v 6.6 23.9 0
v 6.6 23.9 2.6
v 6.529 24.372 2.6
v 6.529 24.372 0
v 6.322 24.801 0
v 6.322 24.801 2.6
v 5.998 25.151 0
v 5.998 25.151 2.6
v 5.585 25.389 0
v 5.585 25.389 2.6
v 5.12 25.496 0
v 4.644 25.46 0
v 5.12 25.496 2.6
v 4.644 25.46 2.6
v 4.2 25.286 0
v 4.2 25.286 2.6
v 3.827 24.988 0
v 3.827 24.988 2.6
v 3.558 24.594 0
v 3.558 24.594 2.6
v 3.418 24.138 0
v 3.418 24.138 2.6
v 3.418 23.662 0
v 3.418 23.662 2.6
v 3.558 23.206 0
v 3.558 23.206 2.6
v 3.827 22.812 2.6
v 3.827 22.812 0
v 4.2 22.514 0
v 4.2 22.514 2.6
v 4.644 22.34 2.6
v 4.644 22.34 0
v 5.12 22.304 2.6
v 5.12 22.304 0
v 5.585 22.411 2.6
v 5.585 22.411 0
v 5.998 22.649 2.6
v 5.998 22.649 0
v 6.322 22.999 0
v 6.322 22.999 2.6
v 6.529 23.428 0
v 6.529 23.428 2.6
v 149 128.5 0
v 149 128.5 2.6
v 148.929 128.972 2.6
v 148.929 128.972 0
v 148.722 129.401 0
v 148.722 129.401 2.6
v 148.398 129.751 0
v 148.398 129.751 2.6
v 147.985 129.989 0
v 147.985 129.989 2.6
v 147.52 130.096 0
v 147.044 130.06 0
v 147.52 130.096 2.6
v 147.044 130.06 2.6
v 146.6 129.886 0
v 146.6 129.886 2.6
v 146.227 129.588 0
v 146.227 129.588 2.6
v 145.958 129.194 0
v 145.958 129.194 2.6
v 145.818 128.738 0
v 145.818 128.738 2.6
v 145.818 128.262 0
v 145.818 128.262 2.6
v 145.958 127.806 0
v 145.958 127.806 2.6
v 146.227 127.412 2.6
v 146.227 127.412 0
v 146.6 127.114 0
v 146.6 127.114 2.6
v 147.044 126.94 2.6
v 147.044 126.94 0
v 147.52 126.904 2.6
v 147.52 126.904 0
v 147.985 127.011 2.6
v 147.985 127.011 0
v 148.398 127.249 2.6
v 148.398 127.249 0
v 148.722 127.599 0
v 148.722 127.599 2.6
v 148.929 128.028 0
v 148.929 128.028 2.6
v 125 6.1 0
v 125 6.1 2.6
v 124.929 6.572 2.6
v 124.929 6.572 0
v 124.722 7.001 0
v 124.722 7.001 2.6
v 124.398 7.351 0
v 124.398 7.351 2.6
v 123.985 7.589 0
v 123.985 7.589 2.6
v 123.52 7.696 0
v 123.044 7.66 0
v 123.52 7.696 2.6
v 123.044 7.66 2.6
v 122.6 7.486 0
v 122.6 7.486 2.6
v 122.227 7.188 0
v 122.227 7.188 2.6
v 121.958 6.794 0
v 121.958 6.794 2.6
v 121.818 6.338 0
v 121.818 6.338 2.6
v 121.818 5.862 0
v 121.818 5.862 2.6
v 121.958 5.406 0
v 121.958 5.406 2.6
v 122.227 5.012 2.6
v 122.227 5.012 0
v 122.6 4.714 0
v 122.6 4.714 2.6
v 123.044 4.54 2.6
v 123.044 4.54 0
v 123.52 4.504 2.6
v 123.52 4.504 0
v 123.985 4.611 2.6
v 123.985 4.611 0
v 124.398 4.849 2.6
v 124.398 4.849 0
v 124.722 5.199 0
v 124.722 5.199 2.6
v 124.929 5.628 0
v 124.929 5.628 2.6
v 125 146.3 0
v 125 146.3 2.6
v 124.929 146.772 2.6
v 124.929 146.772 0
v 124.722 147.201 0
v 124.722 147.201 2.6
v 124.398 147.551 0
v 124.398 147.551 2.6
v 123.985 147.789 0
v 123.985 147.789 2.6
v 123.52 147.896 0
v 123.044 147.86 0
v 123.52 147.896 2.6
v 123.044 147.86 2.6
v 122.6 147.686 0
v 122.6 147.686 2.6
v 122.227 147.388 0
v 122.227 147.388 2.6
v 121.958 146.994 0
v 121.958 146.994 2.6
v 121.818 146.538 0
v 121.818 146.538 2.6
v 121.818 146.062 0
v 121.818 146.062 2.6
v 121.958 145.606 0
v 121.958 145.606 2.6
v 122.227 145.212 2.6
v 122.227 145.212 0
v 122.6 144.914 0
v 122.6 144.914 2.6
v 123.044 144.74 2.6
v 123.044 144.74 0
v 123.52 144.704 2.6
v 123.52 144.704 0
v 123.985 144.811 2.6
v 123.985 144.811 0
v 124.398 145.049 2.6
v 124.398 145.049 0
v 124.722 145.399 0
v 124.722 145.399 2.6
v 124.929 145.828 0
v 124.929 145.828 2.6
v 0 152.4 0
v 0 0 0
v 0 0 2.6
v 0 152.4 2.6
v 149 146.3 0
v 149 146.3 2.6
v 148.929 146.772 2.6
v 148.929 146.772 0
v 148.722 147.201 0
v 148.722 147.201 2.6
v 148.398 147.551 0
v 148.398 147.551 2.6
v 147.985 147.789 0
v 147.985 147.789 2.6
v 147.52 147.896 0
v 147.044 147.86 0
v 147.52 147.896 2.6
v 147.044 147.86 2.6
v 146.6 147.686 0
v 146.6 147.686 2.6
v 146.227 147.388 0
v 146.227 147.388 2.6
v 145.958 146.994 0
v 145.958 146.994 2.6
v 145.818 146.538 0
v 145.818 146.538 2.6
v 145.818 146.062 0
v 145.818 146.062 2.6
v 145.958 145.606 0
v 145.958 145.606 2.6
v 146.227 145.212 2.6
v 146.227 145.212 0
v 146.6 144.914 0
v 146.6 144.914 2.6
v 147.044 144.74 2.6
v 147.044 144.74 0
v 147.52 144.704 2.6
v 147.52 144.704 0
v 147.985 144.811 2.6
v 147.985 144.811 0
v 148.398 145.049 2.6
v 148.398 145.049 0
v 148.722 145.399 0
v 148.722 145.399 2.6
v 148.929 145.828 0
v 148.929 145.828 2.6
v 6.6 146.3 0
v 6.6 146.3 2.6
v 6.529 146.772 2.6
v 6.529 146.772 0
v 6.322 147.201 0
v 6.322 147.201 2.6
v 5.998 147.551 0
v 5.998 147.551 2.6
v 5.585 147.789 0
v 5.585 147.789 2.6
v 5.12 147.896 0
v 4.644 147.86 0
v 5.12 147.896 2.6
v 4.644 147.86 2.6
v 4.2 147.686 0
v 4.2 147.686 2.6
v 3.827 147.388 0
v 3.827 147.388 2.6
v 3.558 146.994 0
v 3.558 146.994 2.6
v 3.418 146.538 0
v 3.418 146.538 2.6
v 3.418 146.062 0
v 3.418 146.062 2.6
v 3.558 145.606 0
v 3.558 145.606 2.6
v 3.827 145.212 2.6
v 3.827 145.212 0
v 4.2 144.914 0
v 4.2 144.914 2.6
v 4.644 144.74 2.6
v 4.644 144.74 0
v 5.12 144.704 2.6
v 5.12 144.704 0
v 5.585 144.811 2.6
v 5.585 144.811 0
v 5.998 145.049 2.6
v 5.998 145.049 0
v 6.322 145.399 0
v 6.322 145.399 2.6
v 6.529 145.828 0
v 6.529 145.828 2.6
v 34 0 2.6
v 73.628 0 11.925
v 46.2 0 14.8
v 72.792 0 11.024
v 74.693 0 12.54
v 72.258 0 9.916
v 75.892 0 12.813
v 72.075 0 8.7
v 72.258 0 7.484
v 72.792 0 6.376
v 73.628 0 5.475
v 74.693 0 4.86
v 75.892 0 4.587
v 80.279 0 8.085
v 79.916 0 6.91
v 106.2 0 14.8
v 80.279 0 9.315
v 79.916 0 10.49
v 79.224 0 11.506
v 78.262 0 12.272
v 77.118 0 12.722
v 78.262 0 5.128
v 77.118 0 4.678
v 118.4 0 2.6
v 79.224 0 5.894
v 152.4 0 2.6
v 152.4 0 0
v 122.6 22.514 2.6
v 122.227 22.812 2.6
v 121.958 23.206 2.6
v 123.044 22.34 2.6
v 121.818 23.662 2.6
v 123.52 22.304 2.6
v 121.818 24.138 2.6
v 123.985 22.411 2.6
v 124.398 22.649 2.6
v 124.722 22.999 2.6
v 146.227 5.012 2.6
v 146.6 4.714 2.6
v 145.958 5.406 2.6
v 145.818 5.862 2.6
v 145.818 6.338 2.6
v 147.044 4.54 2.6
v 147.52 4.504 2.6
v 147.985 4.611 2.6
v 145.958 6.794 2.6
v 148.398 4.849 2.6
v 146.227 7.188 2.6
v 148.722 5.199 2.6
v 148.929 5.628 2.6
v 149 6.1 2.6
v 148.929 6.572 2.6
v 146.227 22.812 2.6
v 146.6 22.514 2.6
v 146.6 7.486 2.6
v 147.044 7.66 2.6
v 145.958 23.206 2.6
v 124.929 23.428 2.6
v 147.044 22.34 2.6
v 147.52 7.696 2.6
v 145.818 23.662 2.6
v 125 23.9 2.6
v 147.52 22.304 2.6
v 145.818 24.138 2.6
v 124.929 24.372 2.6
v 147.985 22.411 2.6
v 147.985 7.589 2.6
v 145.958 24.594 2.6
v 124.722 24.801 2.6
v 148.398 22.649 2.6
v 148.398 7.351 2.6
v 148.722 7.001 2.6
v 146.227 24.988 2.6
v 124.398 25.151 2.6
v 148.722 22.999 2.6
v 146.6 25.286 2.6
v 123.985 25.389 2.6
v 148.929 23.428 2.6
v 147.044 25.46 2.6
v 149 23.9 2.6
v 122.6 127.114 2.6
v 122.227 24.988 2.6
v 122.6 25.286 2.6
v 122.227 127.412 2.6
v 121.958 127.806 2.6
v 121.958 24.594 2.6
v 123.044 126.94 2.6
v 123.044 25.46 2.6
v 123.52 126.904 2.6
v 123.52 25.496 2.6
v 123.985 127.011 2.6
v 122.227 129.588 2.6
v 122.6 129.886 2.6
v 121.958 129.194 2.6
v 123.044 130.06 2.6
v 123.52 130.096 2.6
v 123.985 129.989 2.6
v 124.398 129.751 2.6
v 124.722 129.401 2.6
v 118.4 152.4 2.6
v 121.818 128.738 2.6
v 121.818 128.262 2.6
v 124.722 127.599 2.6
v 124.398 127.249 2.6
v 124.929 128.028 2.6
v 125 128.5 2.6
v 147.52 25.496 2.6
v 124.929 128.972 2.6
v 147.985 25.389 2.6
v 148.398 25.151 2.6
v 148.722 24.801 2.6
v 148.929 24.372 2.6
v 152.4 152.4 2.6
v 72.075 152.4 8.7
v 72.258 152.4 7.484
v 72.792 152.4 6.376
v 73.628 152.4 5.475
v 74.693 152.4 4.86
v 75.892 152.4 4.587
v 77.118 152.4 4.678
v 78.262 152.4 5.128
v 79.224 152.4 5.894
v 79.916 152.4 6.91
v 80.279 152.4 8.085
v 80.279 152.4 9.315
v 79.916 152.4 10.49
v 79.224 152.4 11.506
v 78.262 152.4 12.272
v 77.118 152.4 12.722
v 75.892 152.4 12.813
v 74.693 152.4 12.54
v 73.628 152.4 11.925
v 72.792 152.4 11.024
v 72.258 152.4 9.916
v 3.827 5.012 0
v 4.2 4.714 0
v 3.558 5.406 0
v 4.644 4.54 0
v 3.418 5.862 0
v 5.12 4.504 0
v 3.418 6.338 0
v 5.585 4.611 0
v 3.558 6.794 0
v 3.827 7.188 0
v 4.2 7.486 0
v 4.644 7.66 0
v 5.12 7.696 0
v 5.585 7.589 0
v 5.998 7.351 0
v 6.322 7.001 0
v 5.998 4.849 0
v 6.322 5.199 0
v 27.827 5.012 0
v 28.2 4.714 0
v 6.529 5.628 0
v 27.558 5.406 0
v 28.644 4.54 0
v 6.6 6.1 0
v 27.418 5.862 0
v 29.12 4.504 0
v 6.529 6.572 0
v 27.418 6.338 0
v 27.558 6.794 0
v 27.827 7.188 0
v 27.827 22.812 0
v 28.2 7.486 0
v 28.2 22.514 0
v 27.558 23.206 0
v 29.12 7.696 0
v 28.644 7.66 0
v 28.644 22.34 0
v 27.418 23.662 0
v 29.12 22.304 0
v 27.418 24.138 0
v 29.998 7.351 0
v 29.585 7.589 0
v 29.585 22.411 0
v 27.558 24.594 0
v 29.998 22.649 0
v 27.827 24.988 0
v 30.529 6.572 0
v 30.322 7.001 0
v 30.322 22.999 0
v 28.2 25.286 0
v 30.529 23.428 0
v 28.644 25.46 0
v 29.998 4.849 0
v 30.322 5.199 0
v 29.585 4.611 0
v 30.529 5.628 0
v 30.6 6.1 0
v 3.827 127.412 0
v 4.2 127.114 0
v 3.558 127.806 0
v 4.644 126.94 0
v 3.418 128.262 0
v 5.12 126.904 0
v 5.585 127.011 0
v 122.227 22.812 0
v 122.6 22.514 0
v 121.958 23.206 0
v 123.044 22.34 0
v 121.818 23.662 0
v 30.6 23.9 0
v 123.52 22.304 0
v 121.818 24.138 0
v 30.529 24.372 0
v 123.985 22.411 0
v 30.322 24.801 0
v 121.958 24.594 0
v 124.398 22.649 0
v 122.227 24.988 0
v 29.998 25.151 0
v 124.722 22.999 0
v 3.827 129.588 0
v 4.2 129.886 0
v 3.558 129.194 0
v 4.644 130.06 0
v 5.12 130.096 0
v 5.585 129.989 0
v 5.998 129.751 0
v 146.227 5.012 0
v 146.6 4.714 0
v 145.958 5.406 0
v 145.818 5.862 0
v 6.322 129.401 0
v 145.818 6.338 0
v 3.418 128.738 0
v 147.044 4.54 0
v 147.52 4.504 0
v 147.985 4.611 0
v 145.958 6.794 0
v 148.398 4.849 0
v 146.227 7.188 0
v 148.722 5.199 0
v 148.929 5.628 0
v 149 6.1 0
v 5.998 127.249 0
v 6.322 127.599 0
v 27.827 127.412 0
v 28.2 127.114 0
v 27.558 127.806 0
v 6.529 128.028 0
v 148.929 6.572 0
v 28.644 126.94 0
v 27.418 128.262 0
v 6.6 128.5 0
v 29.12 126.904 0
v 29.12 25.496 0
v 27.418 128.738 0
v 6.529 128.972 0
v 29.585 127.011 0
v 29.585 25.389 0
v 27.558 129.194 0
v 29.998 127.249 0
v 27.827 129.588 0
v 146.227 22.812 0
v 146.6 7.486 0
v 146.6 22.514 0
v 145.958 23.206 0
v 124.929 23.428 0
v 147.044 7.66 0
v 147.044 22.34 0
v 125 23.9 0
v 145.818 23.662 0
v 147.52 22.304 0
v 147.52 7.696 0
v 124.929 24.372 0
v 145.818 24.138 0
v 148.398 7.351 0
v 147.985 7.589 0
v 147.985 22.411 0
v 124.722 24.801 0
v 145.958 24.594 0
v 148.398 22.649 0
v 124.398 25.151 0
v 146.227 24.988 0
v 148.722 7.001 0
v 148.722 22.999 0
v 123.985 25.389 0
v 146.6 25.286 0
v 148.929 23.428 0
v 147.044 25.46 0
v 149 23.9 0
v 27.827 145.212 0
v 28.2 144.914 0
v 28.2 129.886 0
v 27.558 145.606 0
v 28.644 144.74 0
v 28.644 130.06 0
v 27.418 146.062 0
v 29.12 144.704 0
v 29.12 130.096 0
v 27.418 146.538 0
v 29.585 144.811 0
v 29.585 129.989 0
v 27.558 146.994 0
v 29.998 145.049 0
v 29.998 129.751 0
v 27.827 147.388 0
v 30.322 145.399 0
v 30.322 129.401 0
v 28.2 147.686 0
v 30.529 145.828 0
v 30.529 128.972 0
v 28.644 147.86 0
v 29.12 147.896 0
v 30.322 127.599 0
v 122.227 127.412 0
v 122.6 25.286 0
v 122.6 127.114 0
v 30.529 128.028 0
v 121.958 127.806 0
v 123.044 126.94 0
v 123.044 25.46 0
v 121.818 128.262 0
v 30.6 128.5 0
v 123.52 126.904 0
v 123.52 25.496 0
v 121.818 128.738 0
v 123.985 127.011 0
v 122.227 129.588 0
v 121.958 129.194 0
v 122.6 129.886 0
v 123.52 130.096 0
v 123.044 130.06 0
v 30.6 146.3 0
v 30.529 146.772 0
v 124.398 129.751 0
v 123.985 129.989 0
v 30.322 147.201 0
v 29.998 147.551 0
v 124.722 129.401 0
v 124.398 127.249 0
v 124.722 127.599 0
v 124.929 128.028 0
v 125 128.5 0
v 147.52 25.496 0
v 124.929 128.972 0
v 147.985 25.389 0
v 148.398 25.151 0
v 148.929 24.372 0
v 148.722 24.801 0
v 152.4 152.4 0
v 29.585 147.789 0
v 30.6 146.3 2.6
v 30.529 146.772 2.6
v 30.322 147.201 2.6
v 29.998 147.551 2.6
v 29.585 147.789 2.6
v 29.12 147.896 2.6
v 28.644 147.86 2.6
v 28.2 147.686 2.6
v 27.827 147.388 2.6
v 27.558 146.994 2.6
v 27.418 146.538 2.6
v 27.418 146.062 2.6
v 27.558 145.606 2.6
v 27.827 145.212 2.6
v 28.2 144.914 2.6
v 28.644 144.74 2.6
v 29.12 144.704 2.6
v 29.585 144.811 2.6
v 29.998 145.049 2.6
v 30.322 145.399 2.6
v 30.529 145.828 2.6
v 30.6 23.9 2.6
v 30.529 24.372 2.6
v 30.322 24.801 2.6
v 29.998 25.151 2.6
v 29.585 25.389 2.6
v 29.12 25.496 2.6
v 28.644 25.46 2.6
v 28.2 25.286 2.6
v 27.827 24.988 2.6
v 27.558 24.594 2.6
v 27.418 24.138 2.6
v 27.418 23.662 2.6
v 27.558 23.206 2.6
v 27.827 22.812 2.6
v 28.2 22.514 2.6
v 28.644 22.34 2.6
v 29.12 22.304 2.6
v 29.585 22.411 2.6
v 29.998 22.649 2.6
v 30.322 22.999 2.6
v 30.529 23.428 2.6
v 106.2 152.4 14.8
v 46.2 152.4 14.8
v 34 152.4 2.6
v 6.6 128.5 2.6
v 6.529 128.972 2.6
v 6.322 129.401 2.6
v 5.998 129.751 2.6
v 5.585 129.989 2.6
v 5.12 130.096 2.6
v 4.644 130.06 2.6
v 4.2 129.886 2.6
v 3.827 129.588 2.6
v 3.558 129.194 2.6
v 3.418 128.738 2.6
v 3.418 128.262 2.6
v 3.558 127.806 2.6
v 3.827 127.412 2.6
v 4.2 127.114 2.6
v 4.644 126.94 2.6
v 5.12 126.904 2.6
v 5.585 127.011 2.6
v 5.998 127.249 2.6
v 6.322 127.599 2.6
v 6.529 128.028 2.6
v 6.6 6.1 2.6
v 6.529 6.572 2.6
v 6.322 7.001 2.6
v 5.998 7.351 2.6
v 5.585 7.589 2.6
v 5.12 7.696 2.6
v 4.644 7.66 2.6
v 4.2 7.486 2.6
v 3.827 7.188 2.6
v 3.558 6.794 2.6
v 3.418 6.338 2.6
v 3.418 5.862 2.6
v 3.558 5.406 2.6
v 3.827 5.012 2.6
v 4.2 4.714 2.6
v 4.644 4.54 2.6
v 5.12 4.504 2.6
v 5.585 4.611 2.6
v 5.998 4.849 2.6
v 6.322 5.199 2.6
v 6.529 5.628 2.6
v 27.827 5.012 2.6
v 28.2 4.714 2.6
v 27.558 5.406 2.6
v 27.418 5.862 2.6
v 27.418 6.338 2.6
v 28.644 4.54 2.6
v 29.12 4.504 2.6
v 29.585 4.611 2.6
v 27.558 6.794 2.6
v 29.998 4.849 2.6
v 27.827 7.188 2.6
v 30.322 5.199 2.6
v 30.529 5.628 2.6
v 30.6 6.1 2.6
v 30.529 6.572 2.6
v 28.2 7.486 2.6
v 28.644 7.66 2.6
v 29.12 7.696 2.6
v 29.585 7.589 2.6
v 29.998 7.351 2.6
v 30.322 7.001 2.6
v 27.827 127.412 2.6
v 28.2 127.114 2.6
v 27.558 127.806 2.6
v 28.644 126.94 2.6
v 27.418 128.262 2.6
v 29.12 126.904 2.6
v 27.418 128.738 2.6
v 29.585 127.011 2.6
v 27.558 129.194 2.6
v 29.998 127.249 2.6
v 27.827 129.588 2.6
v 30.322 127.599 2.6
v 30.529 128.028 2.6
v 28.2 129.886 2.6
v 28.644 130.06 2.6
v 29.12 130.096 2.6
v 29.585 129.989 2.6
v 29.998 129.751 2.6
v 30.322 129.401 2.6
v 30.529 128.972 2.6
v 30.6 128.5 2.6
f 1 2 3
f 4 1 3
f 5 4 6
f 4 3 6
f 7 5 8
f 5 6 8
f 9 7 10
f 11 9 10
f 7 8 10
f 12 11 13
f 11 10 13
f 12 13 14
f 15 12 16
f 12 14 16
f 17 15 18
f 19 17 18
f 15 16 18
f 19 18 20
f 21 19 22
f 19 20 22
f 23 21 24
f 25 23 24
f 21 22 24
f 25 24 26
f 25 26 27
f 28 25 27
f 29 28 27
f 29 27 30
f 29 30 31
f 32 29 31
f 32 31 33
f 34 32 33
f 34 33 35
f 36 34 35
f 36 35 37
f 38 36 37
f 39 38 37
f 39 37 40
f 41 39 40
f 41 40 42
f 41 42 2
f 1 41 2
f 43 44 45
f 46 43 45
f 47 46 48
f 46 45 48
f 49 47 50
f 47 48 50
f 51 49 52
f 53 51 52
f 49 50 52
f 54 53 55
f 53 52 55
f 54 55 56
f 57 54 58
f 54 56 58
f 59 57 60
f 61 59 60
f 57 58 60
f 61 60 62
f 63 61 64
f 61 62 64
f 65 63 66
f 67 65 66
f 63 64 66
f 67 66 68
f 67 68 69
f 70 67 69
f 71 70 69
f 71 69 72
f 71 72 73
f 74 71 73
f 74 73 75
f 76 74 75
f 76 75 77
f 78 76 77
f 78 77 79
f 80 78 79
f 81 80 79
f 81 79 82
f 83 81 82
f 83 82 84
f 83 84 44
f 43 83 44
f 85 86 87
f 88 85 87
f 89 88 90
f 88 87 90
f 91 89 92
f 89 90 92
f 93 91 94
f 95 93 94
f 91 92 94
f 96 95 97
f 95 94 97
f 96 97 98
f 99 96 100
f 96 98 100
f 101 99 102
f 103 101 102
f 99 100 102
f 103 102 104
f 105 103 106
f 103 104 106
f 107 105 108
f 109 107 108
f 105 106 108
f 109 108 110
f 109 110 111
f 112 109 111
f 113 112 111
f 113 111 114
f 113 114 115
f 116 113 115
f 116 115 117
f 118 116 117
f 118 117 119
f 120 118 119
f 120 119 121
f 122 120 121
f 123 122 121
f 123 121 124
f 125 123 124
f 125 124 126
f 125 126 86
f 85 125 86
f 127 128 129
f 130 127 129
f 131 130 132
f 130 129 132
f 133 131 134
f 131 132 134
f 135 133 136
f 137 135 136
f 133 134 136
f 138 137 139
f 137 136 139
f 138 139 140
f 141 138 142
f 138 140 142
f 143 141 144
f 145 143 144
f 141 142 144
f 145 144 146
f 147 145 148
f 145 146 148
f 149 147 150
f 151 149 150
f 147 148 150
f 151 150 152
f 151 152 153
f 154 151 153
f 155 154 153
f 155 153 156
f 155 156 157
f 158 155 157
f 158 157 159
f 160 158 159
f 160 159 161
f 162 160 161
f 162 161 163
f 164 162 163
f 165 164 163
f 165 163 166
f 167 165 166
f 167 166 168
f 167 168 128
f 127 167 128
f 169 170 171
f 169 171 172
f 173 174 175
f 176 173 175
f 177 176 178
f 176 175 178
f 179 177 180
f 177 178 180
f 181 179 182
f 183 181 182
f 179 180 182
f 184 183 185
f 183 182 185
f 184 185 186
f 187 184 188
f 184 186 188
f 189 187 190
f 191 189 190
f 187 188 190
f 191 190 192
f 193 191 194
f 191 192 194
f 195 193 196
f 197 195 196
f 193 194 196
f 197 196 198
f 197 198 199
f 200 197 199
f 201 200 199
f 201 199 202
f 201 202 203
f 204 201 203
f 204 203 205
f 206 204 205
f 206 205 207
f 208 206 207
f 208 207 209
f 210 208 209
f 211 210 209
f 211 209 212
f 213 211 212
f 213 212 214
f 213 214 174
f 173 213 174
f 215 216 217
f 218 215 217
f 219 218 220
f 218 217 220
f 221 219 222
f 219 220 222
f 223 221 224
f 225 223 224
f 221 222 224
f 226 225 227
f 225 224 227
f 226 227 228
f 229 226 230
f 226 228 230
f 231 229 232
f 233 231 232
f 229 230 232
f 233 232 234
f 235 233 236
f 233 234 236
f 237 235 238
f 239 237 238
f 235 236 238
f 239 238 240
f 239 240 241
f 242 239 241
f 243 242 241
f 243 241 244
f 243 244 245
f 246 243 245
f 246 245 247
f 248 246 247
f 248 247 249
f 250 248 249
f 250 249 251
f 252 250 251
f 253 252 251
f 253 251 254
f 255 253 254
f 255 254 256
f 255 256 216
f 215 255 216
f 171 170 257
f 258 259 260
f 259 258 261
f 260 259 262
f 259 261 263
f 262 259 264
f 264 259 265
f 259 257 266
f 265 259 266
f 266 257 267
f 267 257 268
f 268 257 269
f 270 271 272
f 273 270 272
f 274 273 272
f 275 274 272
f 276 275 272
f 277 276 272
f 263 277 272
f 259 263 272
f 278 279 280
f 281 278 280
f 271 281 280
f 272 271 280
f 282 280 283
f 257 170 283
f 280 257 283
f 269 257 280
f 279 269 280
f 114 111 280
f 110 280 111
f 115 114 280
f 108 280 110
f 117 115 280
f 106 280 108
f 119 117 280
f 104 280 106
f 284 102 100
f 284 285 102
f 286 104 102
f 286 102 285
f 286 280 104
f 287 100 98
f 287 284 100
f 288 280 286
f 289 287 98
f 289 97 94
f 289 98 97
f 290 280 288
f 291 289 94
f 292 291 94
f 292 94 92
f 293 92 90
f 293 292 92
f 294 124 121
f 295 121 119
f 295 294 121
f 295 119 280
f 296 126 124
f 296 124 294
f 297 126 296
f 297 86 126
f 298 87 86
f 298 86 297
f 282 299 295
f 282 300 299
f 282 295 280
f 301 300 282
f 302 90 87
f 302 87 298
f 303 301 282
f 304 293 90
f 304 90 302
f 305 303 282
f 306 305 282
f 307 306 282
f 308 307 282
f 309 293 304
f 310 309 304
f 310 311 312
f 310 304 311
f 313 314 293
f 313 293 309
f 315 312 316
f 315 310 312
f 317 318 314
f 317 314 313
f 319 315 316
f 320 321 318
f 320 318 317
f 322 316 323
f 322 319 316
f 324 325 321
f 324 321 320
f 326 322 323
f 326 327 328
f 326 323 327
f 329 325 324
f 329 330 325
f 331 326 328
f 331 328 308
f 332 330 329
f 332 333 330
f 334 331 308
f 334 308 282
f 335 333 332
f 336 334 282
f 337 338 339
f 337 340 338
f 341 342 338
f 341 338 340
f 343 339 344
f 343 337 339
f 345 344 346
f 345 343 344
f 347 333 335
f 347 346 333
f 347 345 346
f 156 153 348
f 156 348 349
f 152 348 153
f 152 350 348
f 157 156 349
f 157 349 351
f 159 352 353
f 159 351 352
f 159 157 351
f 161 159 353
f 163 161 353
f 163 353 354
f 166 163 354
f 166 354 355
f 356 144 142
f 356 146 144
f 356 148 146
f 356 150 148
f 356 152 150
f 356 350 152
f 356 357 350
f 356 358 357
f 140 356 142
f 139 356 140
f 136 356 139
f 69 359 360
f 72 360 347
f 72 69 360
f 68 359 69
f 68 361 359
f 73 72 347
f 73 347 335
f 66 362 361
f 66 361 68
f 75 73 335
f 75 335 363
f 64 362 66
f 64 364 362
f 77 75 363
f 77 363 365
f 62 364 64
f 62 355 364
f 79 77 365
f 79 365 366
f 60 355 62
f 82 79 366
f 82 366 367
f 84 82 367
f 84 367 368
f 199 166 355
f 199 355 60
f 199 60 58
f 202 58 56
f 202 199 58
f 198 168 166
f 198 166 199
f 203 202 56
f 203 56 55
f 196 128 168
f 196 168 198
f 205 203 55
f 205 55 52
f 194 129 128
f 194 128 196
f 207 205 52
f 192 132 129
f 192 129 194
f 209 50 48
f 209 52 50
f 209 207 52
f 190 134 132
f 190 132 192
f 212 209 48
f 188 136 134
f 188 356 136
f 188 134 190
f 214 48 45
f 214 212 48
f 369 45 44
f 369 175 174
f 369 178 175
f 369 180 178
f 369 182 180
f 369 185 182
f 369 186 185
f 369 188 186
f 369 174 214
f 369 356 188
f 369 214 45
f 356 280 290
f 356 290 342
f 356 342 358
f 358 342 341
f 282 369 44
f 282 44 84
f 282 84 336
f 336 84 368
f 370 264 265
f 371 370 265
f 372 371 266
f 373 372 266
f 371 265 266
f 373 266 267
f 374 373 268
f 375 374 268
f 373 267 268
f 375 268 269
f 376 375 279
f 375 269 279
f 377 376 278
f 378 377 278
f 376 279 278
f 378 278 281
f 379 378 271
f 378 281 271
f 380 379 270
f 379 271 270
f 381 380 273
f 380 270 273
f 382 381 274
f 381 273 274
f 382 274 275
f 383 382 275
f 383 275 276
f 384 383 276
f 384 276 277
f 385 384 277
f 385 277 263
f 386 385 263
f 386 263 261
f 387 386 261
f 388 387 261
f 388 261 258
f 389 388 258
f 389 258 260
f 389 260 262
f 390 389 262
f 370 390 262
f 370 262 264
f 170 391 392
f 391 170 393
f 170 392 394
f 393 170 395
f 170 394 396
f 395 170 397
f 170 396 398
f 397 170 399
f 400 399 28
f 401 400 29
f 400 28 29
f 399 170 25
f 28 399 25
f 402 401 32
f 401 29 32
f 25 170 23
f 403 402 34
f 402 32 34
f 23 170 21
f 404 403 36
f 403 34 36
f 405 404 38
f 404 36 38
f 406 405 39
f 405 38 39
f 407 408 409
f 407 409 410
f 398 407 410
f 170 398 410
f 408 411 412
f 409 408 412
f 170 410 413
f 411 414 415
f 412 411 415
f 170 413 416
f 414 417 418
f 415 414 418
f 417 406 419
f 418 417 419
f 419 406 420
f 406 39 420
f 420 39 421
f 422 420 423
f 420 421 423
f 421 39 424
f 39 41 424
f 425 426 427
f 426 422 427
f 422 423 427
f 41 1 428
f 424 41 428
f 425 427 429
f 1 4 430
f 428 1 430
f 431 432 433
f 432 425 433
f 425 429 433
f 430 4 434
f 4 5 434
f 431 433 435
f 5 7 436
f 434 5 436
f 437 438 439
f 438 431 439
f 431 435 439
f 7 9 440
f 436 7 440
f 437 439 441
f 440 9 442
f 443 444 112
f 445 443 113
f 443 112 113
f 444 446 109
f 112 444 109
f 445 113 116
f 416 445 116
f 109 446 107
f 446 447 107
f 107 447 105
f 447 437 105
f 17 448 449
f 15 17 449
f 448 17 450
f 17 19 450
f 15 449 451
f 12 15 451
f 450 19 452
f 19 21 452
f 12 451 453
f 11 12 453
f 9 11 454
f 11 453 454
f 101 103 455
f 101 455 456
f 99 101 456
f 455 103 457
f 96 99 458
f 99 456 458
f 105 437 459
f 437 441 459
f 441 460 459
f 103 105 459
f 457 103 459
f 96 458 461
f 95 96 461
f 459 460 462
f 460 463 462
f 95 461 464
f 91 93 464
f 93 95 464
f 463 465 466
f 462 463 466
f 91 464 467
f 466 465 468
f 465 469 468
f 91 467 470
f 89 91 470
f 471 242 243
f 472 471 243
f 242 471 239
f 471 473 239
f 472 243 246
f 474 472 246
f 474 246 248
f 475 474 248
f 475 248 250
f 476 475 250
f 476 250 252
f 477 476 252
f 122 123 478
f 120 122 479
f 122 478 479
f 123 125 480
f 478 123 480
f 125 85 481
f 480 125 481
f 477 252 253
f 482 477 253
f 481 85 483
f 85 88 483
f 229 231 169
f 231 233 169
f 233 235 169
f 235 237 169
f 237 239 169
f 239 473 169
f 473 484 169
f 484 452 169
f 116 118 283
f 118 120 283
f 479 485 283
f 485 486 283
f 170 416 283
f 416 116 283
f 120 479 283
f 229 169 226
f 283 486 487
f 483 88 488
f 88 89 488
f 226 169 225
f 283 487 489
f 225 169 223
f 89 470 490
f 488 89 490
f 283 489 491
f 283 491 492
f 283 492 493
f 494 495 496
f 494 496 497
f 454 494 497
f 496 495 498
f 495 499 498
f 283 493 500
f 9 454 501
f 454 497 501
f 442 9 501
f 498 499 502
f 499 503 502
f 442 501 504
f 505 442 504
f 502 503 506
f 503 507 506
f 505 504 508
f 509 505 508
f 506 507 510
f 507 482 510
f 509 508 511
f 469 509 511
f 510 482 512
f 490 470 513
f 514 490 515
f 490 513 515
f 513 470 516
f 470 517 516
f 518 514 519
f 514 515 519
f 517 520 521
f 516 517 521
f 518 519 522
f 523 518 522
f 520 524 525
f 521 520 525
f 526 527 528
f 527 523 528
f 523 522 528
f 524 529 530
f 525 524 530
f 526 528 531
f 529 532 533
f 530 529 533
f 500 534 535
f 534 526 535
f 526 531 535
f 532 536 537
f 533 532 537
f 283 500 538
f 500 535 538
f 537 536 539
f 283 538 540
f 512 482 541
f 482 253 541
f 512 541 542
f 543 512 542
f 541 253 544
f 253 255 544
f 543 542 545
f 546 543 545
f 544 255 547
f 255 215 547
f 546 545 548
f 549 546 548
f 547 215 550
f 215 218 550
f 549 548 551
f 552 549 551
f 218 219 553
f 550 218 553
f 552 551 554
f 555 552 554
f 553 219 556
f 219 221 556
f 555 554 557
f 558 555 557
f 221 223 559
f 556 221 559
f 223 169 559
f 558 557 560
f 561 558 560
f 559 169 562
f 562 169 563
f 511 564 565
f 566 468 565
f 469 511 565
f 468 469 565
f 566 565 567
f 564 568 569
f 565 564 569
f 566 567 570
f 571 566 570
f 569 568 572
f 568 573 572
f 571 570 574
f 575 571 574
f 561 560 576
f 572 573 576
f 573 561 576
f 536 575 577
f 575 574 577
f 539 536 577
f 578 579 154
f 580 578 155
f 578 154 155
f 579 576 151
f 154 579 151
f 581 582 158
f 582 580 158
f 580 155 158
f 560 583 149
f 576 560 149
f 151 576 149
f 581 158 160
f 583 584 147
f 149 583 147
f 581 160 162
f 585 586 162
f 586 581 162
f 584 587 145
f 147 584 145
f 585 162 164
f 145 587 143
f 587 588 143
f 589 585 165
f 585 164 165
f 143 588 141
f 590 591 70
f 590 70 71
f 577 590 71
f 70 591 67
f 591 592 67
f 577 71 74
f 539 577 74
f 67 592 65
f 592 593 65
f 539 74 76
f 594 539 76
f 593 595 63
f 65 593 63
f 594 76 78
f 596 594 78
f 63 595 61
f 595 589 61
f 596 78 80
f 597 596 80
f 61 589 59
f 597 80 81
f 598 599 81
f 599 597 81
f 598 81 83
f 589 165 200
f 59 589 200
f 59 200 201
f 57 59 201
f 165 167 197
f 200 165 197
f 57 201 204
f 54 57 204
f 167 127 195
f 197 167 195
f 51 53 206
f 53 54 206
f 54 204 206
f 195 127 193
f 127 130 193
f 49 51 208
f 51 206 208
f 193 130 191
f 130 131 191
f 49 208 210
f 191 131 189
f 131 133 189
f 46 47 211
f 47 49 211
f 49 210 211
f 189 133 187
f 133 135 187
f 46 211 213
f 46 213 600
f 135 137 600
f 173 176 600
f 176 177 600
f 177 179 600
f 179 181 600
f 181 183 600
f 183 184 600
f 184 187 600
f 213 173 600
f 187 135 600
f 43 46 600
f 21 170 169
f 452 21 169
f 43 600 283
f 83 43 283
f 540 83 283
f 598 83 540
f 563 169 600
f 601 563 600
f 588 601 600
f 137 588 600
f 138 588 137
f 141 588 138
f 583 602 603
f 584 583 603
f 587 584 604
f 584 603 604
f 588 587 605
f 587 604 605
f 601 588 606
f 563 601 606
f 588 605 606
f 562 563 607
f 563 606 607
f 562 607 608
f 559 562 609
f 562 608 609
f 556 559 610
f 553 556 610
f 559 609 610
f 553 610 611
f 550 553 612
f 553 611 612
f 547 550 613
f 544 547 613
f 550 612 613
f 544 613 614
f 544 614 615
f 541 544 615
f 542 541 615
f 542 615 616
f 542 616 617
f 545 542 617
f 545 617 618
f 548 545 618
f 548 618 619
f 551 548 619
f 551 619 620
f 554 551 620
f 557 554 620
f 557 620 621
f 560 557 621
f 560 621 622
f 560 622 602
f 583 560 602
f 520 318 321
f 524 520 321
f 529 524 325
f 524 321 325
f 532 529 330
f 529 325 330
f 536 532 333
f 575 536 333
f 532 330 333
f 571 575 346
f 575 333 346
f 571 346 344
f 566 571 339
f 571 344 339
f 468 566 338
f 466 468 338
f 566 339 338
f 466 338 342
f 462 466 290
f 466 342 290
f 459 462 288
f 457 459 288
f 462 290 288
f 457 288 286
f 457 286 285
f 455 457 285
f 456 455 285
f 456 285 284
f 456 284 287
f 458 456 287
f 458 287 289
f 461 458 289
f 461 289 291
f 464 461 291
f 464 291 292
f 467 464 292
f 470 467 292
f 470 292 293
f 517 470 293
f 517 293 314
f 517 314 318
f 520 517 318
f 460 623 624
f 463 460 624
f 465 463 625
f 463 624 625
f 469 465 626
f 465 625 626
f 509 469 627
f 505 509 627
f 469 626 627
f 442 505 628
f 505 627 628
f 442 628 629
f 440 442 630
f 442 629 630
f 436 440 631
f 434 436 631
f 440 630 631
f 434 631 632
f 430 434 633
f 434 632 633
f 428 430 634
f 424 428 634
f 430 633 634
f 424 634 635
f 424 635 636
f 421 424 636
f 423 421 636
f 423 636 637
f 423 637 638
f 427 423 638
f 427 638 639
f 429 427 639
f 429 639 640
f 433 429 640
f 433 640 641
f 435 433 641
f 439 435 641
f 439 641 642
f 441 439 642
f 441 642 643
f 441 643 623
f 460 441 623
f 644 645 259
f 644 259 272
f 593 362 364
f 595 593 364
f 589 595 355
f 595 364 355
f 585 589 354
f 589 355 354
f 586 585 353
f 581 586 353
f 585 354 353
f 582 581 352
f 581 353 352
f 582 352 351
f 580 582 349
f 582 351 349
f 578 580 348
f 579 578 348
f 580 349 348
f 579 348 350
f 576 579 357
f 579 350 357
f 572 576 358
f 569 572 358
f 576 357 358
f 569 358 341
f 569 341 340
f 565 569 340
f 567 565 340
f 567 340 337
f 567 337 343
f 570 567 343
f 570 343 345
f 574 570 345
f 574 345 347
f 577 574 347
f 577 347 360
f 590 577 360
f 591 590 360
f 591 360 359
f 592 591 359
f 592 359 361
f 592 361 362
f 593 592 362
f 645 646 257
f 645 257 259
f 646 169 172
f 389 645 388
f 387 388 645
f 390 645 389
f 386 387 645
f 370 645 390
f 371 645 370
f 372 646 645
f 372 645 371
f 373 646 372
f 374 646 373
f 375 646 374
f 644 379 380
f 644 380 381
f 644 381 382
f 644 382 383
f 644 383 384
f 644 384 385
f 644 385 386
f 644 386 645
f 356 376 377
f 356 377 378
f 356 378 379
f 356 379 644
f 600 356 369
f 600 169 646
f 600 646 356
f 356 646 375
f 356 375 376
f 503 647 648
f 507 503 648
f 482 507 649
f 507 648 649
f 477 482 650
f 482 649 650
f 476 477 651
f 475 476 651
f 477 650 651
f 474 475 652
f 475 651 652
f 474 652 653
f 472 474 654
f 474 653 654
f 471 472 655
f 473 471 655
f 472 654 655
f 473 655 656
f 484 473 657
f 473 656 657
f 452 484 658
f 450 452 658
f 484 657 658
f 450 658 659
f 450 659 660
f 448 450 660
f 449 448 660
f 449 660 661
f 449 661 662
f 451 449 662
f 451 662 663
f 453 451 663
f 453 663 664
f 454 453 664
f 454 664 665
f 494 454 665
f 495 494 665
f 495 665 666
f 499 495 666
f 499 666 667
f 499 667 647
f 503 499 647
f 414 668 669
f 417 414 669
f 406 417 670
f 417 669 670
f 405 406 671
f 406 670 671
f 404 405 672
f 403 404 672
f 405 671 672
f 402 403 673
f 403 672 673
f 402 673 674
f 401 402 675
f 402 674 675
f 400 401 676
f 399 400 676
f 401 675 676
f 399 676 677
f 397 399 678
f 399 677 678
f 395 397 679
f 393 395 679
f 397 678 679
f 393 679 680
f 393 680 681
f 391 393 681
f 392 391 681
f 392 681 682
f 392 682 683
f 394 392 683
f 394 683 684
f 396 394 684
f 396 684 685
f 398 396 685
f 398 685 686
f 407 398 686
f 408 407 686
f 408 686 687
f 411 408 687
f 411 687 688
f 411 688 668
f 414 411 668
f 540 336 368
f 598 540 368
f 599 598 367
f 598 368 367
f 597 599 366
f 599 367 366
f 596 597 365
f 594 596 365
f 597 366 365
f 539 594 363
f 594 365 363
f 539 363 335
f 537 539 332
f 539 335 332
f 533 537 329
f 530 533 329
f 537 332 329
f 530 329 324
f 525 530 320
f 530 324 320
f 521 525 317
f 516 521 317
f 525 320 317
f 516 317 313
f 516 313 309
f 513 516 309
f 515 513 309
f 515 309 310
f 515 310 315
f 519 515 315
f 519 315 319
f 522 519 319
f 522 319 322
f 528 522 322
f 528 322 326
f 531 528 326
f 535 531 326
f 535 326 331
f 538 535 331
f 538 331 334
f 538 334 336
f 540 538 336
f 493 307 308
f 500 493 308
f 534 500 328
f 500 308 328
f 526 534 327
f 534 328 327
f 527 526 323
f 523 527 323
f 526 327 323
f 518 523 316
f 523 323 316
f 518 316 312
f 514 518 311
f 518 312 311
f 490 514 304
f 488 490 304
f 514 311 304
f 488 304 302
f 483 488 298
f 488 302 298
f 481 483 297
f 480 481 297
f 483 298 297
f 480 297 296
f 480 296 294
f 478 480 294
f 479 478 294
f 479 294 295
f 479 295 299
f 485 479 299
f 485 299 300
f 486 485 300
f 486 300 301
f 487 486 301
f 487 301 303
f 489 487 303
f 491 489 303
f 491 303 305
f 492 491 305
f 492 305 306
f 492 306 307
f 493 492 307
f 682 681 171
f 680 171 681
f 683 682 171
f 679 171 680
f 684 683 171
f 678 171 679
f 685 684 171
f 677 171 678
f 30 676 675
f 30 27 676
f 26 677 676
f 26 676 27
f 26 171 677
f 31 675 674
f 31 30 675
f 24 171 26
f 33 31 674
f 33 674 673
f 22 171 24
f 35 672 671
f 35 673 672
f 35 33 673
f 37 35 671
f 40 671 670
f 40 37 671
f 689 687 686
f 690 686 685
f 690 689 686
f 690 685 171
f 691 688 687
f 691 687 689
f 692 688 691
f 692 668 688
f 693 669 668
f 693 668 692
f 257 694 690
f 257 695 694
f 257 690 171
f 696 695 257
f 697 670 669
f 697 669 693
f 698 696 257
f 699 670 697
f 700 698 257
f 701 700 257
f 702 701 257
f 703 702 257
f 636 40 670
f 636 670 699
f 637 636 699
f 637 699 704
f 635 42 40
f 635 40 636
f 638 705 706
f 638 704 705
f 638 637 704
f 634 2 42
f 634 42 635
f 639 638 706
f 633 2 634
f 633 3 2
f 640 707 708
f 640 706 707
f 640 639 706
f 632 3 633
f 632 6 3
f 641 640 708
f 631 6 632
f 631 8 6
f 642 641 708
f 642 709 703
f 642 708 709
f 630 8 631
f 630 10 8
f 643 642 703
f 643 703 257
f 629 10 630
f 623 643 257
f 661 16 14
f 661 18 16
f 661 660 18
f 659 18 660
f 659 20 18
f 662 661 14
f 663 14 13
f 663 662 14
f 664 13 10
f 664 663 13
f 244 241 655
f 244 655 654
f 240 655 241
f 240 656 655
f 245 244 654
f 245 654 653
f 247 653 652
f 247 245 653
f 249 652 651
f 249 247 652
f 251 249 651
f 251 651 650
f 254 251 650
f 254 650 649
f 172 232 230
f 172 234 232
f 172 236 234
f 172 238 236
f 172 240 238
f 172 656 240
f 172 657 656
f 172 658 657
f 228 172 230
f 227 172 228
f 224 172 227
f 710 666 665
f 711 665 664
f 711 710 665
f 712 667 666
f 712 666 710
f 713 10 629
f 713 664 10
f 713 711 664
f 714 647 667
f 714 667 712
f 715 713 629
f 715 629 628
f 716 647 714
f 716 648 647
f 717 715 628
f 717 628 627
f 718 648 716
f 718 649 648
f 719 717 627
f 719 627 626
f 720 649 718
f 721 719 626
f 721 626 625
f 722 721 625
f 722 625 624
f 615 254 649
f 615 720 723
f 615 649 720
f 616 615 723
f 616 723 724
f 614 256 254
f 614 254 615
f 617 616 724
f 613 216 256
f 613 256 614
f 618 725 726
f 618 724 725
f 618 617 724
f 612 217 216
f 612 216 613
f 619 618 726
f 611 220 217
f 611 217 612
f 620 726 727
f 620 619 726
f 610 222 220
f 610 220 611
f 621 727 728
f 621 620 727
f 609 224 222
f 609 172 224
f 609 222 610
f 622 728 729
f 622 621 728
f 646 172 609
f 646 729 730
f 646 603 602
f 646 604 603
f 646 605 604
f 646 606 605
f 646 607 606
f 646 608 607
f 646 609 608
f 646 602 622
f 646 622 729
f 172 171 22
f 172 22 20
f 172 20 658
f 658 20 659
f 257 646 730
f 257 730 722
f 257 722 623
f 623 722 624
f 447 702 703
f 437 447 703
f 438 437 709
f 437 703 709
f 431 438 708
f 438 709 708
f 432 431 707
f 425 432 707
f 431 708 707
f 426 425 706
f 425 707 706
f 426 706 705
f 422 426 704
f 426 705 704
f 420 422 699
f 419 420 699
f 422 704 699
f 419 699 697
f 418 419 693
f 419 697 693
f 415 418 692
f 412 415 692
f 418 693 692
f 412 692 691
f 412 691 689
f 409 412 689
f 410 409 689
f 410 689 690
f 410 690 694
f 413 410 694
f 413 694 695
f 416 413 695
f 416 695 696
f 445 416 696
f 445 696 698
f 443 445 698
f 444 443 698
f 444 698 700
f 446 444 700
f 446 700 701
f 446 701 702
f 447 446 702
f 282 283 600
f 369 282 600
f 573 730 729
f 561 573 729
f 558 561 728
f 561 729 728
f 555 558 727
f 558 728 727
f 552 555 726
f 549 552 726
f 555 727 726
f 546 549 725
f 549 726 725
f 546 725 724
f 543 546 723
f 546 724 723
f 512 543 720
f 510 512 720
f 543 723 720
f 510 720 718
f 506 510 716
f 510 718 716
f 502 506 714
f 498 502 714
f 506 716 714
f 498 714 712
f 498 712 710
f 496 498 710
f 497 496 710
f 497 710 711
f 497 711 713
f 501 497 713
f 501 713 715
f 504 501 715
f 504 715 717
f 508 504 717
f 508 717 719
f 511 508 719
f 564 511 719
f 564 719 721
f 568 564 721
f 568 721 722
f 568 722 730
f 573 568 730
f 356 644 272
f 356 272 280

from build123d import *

# Parameters (mm, degrees)
SKETCH1_W                    = 152.4
SKETCH1_H                    = 152.4
BOSS_EXTRUDE1_DEPTH          = 2.6
BOSS_EXTRUDE4_DEPTH          = 152.4
TAP_DRILL_FOR_M8_HELICOIL2_D = 8.25
SKETCH2_R                    = 1.6
CUT_EXTRUDE1_DEPTH           = 3.6


with BuildPart() as part:
    # Sketch1 → Boss-Extrude1 (new body)
    with BuildSketch(Plane.XY):
        with Locations((76.2, 76.2)):
            Rectangle(SKETCH1_W, SKETCH1_H)
    extrude(amount=BOSS_EXTRUDE1_DEPTH)

    # Sketch8 → Boss-Extrude4 (add, through all)
    with BuildSketch(Plane(origin=(0, 152.4, 0), x_dir=(1, 0, 0), z_dir=(0, 1, 0))):
        Polygon((34, -2.6), (46.2, -14.8), (106.2, -14.8), (118.4, -2.6), align=None)
    extrude(amount=-BOSS_EXTRUDE4_DEPTH)

    # Tap Drill for M8 Helicoil2 (through all)
    with Locations(Plane(origin=(0, 152.4, 0), x_dir=(1, 0, 0), z_dir=(0, 1, 0))):
        with Locations((76.2, -8.7)):
            Hole(TAP_DRILL_FOR_M8_HELICOIL2_D / 2)

    # Sketch2 → Cut-Extrude1 (cut, through all)
    with BuildSketch(Plane.XY.offset(2.6)):
        with Locations((5, 128.5)):
            Circle(SKETCH2_R)
        with Locations((29, 146.3)):
            Circle(SKETCH2_R)
        with Locations((5, 146.3)):
            Circle(SKETCH2_R)
        with Locations((29, 128.5)):
            Circle(SKETCH2_R)
        with Locations((123.4, 146.3)):
            Circle(SKETCH2_R)
        with Locations((147.4, 146.3)):
            Circle(SKETCH2_R)
        with Locations((147.4, 128.5)):
            Circle(SKETCH2_R)
        with Locations((123.4, 128.5)):
            Circle(SKETCH2_R)
        with Locations((123.4, 23.9)):
            Circle(SKETCH2_R)
        with Locations((147.4, 23.9)):
            Circle(SKETCH2_R)
        with Locations((147.4, 6.1)):
            Circle(SKETCH2_R)
        with Locations((123.4, 6.1)):
            Circle(SKETCH2_R)
        with Locations((5, 23.9)):
            Circle(SKETCH2_R)
        with Locations((29, 23.9)):
            Circle(SKETCH2_R)
        with Locations((29, 6.1)):
            Circle(SKETCH2_R)
        with Locations((5, 6.1)):
            Circle(SKETCH2_R)
    extrude(amount=-CUT_EXTRUDE1_DEPTH, mode=Mode.SUBTRACT)


solid = part.part
